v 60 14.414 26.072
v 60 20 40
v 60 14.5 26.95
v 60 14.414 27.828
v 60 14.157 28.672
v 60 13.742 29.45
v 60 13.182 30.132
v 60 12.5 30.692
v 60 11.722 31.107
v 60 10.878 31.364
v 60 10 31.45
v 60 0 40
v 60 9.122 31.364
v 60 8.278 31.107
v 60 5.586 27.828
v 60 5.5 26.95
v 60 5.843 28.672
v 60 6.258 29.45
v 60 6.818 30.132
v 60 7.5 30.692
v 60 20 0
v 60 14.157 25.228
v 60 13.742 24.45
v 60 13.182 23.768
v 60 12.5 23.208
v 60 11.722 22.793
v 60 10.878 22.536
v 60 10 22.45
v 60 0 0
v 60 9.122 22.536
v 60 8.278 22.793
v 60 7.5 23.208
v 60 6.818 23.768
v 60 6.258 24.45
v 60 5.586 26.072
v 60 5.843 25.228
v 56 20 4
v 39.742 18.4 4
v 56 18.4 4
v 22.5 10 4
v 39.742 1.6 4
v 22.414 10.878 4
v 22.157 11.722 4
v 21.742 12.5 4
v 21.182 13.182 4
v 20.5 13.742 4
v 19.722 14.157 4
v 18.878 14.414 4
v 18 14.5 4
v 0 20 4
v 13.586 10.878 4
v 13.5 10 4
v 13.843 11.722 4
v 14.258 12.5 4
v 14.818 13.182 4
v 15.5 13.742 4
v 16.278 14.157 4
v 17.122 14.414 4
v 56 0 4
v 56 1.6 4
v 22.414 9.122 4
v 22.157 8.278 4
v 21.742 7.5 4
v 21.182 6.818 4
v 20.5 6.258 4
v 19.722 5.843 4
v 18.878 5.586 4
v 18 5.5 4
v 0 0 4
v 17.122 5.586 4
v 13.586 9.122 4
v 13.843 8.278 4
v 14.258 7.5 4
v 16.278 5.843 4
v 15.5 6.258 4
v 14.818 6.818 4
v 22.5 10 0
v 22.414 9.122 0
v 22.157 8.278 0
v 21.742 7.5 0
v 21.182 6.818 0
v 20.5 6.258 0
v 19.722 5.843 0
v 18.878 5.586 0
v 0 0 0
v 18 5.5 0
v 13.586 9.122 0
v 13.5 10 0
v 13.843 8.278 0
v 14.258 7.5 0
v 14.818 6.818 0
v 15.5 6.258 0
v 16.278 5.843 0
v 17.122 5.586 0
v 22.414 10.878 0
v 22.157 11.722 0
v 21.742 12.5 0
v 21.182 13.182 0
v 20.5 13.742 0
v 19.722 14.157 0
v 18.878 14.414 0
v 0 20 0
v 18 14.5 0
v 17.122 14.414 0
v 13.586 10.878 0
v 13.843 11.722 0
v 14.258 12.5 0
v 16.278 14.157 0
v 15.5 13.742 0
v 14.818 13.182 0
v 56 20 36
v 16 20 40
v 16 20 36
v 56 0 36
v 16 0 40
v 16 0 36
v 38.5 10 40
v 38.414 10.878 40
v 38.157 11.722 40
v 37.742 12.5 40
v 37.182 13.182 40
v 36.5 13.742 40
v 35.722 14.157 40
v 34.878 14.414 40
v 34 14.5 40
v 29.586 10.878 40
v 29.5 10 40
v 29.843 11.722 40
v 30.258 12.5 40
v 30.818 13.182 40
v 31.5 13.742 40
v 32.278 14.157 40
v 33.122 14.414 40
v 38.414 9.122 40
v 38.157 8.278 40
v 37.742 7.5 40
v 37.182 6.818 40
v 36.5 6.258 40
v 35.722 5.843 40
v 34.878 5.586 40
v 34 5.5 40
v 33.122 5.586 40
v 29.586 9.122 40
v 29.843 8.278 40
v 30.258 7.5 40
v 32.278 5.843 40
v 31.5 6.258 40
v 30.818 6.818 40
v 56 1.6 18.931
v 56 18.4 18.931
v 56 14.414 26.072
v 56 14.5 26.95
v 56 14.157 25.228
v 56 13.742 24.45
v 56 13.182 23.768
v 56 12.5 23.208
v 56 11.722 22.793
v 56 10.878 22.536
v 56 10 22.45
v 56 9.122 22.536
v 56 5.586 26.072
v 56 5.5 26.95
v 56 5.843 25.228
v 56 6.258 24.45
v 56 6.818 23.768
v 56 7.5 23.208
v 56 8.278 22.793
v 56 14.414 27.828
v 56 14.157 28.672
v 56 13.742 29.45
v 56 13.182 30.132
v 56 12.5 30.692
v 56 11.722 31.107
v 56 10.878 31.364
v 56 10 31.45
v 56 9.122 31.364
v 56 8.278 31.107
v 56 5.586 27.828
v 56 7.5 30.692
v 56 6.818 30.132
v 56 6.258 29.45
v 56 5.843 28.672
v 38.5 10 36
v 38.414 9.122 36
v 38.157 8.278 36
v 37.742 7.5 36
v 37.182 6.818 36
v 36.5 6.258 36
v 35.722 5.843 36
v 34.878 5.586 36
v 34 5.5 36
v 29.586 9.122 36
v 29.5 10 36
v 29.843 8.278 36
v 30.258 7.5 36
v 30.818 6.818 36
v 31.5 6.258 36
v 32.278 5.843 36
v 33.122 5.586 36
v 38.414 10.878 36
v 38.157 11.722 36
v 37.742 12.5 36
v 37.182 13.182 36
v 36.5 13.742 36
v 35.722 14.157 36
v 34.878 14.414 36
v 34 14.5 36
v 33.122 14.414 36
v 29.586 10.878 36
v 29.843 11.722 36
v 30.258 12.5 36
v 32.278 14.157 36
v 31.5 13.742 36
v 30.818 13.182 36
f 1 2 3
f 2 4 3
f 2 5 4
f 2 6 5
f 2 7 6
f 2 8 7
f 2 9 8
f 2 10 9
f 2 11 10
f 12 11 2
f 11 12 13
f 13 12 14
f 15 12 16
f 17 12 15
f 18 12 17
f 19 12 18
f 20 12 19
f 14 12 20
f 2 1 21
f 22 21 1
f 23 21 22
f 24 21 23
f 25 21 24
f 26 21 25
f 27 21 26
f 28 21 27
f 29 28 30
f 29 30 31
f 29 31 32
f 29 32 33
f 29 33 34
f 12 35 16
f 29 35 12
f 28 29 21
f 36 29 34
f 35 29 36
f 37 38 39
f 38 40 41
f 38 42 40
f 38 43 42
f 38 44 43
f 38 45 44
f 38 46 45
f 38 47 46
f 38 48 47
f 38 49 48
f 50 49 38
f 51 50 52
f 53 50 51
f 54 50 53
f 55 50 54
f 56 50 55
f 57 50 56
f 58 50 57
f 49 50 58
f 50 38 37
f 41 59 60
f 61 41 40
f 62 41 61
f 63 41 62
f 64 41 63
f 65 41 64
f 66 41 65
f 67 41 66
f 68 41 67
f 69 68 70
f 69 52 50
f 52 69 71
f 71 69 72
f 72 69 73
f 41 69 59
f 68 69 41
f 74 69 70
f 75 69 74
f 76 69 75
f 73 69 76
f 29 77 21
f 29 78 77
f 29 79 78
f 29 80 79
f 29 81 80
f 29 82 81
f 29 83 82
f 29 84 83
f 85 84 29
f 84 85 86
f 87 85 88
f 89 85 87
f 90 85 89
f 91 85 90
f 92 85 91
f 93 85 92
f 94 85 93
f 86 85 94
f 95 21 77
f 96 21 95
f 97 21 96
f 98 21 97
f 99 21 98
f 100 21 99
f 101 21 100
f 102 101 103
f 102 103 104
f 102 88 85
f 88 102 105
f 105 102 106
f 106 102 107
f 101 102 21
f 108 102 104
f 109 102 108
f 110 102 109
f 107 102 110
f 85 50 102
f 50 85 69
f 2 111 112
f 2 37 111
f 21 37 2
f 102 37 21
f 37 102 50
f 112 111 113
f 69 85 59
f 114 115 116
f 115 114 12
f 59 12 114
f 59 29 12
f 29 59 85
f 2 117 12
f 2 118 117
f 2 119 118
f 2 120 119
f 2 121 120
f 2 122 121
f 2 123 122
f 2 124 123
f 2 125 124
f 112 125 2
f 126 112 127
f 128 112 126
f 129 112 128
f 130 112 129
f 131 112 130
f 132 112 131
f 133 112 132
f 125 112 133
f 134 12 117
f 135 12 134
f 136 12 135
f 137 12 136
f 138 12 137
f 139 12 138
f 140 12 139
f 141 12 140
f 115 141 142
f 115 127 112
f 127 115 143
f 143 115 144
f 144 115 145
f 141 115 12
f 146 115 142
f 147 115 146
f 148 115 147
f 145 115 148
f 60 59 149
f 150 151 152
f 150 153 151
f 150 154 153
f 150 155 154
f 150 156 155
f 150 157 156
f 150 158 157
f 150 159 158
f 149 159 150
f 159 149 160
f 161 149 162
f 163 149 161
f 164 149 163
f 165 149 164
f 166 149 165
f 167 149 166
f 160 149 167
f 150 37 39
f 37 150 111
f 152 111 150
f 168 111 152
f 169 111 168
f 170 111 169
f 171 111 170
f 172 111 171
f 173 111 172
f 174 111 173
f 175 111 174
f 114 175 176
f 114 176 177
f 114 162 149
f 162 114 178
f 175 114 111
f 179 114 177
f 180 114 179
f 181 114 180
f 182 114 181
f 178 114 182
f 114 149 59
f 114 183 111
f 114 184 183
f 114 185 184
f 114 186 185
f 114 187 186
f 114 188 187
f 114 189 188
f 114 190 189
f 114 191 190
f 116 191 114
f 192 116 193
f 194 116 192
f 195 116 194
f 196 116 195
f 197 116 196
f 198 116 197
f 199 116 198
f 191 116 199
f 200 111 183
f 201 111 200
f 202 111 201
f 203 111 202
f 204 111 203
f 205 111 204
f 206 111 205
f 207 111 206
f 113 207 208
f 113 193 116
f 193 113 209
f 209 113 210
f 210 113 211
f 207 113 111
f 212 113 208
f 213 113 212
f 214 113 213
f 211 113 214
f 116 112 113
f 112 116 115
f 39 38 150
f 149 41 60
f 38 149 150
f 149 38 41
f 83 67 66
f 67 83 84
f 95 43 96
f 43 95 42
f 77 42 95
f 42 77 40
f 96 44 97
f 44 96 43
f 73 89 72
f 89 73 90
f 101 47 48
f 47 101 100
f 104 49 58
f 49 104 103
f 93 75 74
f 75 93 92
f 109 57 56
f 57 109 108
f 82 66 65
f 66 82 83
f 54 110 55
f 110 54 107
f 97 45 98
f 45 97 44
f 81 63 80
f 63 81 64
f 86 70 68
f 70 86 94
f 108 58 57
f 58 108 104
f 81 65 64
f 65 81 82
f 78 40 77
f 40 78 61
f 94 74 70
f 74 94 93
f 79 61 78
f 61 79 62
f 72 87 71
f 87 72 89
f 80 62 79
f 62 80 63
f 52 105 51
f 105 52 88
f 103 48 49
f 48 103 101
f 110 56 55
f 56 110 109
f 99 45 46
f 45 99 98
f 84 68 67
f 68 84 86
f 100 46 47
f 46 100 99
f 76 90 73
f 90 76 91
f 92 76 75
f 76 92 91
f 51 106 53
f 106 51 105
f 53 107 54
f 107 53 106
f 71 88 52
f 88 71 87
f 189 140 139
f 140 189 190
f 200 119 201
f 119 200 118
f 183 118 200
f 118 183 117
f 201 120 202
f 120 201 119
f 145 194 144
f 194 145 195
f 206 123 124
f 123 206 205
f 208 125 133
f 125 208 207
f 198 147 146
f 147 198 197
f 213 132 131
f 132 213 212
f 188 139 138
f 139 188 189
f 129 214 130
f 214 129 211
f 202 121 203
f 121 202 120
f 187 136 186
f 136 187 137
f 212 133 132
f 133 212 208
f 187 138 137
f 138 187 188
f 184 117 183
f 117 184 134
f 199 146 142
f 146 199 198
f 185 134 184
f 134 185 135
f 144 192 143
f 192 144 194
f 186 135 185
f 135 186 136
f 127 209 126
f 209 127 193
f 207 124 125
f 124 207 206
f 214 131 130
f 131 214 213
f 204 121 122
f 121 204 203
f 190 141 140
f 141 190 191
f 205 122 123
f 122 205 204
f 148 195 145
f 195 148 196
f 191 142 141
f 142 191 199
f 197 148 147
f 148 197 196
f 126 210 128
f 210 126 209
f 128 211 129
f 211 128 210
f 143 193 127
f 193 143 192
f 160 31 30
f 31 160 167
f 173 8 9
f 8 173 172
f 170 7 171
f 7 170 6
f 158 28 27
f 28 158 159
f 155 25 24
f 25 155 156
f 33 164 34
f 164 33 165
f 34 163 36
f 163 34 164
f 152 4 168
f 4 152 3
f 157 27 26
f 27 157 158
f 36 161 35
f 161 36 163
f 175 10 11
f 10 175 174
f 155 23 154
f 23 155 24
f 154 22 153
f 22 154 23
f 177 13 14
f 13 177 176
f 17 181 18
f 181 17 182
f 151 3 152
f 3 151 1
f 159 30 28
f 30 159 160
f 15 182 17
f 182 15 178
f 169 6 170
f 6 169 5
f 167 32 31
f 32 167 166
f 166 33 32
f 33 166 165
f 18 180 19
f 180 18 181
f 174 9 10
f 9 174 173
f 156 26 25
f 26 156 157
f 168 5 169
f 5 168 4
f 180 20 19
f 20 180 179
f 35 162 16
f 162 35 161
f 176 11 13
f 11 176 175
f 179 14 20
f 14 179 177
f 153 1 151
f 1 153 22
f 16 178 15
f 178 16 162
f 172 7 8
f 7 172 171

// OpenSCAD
$fn = 32;

// ----------------------------------------------------------------------
// Z-bracket: 60 x 20 x 40 mm
// ----------------------------------------------------------------------

// --- parameters (mm) ---
foot_len = 60;            // lower foot length, X
top_len = 40;             // upper foot length, X
depth = 20;               // bracket width, Y
step_h = 40;              // overall rise, Z
plate_t = 4;              // plate thickness
hole_d = 9;               // clearance for M8
rib_len = 18;             // gusset leg
rib_sink = 1.6;           // gusset overlap into the plates

module hole_z(px, py, z0) {
  translate([px, py, z0 - 2.5]) cylinder(h = plate_t + 5, d = hole_d);
}
module hole_x(py, pz) {
  translate([-2.5, py, pz]) rotate([0, 90, 0]) cylinder(h = plate_t + 5, d = hole_d);
}
module gusset(x0) {
  translate([x0, depth - rib_sink, 0])
    rotate([90, 0, 0])
      linear_extrude(height = depth - 2 * rib_sink)
        polygon(points = [[rib_sink, plate_t - rib_sink],
                          [rib_sink, plate_t - rib_sink + rib_len],
                          [-rib_len, plate_t - rib_sink]]);
}

difference() {
  union() {
    cube([foot_len, depth, plate_t]);
    /* web, overlapping the lower foot */
    translate([foot_len - plate_t, 0, 0]) cube([plate_t, depth, step_h]);
    /* upper foot, sunk into the web */
    translate([foot_len - plate_t - top_len, 0, step_h - plate_t]) cube([top_len + plate_t, depth, plate_t]);
    gusset(foot_len - plate_t);
  }
  hole_z(18, 10, 0);
  translate([foot_len - plate_t - 22, 0, 0]) hole_z(0, 10, step_h - plate_t);
  translate([foot_len - plate_t, 0, 0]) hole_x(10, 26.95);
}
